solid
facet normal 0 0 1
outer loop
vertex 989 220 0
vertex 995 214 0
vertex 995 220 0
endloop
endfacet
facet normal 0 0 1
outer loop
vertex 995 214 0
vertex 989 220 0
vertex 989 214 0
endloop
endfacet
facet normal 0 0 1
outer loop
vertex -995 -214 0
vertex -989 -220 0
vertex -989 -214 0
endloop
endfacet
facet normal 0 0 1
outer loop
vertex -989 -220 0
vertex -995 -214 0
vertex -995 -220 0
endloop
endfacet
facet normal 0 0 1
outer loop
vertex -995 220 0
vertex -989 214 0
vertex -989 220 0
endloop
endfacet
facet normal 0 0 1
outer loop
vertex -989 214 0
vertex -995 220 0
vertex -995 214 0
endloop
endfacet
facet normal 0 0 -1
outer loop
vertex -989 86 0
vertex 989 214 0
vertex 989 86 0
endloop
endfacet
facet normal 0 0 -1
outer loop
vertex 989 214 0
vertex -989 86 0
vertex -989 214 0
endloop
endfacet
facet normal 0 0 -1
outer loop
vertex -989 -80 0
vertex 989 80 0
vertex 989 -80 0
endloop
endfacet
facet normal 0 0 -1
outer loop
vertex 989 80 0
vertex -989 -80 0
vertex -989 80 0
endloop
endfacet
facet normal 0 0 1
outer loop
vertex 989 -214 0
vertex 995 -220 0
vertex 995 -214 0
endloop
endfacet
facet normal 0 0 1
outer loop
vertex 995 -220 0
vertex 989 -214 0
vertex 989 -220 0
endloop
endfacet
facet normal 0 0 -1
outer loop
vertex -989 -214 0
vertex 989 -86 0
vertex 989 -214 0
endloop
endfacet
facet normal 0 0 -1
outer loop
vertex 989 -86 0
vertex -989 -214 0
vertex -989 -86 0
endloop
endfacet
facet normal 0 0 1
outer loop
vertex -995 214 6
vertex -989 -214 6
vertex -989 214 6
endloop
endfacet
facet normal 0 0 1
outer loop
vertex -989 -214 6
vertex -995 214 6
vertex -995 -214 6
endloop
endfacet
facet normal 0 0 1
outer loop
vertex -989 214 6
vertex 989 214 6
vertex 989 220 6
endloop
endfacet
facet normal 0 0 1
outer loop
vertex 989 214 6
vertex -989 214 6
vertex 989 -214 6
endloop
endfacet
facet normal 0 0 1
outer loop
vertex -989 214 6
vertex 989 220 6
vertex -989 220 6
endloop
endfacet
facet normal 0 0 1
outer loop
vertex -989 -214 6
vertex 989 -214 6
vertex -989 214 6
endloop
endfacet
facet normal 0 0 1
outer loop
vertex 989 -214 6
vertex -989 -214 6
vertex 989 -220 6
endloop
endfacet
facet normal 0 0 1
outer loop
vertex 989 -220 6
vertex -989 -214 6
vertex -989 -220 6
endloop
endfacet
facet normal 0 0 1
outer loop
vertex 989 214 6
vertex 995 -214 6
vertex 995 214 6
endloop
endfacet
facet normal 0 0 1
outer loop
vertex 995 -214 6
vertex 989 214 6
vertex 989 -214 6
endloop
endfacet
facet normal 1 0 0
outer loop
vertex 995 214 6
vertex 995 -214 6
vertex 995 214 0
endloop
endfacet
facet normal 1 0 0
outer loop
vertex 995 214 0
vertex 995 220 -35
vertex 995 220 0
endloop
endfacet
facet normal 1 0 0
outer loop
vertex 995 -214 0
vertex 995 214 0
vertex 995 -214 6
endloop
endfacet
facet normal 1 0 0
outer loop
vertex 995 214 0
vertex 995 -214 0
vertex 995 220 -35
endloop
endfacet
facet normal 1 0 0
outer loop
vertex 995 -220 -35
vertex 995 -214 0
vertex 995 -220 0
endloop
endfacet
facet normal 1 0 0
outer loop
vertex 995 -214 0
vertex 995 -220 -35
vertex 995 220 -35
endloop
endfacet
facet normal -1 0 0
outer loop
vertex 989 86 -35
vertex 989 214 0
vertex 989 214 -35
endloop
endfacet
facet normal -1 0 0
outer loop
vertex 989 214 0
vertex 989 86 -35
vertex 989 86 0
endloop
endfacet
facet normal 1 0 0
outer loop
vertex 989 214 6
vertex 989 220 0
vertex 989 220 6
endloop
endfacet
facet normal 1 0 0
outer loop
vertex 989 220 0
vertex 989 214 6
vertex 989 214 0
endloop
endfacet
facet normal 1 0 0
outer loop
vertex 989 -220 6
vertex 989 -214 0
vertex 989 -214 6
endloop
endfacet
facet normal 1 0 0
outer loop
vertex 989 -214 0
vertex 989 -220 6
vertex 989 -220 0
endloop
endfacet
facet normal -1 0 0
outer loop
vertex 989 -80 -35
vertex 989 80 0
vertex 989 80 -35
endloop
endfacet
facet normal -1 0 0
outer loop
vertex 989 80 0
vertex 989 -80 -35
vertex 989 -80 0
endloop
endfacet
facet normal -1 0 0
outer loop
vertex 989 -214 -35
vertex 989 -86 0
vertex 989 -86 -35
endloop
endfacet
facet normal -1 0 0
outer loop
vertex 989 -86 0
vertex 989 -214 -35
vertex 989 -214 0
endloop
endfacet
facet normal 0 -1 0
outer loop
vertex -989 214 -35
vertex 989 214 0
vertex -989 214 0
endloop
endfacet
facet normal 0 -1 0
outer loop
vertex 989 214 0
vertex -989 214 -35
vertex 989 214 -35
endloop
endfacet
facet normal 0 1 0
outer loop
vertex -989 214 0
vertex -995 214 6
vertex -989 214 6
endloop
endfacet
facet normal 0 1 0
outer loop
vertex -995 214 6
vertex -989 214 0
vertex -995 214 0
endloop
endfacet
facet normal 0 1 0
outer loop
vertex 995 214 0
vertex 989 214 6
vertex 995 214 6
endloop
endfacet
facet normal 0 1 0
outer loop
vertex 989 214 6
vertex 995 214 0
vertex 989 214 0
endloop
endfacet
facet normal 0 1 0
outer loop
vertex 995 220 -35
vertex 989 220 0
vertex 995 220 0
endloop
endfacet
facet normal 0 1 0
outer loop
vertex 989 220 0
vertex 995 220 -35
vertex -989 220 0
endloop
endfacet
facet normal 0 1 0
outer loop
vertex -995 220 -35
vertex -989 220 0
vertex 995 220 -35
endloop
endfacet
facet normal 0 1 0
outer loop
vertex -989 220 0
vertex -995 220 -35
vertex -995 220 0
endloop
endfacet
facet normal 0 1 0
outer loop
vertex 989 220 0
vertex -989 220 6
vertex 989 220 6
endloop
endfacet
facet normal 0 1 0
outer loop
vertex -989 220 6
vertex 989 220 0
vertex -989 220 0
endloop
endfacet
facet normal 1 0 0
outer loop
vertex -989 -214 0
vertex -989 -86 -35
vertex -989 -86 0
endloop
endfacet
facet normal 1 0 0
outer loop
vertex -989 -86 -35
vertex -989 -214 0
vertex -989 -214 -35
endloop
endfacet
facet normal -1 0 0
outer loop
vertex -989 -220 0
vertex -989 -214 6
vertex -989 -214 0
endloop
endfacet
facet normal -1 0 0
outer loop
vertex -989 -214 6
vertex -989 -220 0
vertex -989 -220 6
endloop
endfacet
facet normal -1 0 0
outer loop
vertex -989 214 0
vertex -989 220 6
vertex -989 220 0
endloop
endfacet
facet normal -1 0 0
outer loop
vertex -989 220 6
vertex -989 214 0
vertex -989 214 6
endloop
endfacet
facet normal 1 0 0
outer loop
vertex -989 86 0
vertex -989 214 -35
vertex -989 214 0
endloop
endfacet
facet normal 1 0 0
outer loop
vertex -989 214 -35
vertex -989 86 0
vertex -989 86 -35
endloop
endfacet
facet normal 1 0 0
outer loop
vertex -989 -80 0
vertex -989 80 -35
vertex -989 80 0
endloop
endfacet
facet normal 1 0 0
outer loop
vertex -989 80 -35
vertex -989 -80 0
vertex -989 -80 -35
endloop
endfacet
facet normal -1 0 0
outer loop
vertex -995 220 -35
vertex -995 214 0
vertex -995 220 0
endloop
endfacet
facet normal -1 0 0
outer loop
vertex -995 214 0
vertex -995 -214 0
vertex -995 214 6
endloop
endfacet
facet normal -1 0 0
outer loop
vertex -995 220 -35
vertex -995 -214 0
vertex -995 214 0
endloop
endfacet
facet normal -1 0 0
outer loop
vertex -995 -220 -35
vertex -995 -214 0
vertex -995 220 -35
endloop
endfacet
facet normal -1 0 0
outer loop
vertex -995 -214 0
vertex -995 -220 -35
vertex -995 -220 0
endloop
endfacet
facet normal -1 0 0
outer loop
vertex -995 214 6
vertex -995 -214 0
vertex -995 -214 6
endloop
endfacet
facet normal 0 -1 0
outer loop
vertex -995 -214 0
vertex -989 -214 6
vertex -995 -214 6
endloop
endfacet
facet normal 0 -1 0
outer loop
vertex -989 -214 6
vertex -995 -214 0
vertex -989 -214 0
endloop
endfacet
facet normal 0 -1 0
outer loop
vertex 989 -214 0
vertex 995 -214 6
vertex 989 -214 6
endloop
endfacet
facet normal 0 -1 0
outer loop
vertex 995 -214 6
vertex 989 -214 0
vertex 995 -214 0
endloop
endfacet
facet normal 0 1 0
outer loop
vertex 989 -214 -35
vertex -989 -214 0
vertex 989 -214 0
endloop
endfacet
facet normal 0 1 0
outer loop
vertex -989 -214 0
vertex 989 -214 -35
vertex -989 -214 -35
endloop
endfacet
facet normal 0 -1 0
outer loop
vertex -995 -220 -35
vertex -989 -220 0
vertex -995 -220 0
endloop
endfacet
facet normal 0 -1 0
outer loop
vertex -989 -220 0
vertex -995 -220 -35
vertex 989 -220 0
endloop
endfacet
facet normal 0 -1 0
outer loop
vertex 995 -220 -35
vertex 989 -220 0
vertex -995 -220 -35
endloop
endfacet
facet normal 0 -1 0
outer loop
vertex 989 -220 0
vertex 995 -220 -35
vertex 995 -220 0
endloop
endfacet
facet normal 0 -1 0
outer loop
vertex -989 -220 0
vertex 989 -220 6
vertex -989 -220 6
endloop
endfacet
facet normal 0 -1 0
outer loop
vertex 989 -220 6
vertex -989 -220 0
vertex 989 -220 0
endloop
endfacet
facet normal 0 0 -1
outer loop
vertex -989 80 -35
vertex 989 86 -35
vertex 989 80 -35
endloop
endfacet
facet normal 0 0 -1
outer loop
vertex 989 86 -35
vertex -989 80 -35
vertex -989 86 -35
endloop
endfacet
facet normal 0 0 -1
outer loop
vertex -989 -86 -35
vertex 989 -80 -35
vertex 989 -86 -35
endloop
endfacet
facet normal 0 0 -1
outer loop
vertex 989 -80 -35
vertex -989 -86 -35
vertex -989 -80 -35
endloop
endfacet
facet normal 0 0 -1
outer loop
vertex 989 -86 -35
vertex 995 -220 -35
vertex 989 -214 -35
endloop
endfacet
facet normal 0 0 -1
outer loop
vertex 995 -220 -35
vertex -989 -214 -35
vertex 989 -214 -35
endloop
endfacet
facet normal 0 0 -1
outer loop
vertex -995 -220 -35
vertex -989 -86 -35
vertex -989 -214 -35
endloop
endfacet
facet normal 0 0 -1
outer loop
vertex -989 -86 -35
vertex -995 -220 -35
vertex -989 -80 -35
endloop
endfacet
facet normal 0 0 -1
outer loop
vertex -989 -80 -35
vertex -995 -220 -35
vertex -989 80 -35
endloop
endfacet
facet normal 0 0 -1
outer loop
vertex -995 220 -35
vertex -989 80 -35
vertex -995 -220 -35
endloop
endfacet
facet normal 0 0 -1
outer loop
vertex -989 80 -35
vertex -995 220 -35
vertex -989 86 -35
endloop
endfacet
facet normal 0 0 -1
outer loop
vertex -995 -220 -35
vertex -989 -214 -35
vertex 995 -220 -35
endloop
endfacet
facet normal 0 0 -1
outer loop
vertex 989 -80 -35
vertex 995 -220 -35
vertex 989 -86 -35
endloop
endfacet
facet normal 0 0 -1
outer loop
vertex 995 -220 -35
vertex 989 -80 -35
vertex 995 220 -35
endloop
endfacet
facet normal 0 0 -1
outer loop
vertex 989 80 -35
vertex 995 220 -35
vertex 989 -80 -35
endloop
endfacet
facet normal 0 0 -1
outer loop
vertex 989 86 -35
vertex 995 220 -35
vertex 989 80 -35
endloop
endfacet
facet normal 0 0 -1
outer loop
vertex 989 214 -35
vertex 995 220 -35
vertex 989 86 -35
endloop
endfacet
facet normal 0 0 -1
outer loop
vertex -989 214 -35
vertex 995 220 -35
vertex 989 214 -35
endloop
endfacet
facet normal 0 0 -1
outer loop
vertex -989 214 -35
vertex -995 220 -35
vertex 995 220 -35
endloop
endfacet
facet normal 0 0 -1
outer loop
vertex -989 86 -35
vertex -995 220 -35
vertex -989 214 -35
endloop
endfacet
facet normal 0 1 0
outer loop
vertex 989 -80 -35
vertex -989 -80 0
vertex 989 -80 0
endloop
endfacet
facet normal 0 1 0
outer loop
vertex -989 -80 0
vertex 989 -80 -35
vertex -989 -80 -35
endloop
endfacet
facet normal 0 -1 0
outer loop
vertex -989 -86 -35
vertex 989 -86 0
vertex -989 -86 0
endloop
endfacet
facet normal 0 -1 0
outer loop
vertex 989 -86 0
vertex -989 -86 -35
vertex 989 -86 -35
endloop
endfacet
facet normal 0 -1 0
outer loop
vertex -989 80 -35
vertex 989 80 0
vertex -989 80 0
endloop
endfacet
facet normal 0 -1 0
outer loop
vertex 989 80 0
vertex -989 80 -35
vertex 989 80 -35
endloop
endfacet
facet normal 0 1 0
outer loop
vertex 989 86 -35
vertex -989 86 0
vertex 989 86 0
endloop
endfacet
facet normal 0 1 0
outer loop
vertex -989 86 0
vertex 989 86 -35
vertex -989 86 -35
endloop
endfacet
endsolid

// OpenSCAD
// file: BasePiezas.scad
/*
     -/+oooo+:.     
  `/syo/:::/+syo-   
 `sy+.     ```-sy/  
 +y+      +::+`-yy- 
 sy-      +-:o:-oy/ 
 sy-       ``   +y/ 
 sy-            /y/ 
 sy-            /y/ 
 sy.            /y/ 
 sy/............oy/ 
 sysoooooooooooosy/ 
`sy/............oy+ 
syyyssssssssssssyyy/
/++++oys++++yy+++++-
     /y+    yy.     
     /y+    yy.     
     `-`    ss` 
    
     IDEA 1.61        
*/


//modulos para el renderizado de varios tipos de caja a manufacturear en la máquina de corte lAser

//Largo se desplaza en "X"
//Ancho se desplaza en "Y"

module base(largo=80,ancho=80,espesor=3,dientes=20,Up=1,Down=1,Left=1,Right=1){
tamDientesLargo=(largo)/dientes;
tamDientesAncho=(ancho)/dientes;


union(){

//Dientes derecha
  if(Right==1){
    translate([largo/2,-ancho/2-tamDientesAncho/2])
    for(i=[1:dientes/2]){
       translate([0,tamDientesAncho*2*i])
       square([2*espesor,tamDientesAncho],center=true);
    }
}

//Dientes Izquierda

if(Left==1){
   translate([-largo/2,-ancho/2-3*tamDientesAncho/2])
   for(i=[1:dientes/2]){
      translate([0,tamDientesAncho*2*i])
      square([2*espesor,tamDientesAncho],center=true);
   }
}

//Dientes Arriba

if(Up==1){
   translate([-largo/2-3*tamDientesLargo/2,ancho/2])
   for(i=[1:dientes/2]){
     translate([tamDientesLargo*2*i,0])
     square([tamDientesLargo,2*espesor],center=true);
   }
}

//Dientes Abajo

if(Down==1){
   translate([-largo/2-tamDientesLargo/2,-ancho/2])
    for(i=[1:dientes/2]){
     translate([tamDientesLargo*2*i,0])
     square([tamDientesLargo,2*espesor],center=true);
    }
}

//Cuadrado
square([largo,ancho],center=true);
}

}//Fin module base


//#####CAJA SIN O CON TAPA####//

module cajaSCTapa (largo=40,ancho=30,alto=40,espesor=3,dientes=6,modo=1,
  tolBisagras=2.2){

//base
        
    if(modo==2){
    base(largo,ancho,espesor,dientes,1,1,0,0);
        }
       else{
        base(largo,ancho,espesor,dientes,1,1,1,1);
           }
    
//Tapa
    
 if(modo==1){
    translate([((largo)+(2.5*espesor)),0])
    square([largo,ancho],center=true);
    
    translate([((largo)+(2.5*espesor)),-ancho/2+(1.5*espesor)])
    square([largo+2*espesor,espesor],center=true);
  
     translate([((largo)+(2.5*espesor)),+ancho/2])
    square([2*espesor,2*espesor],center=true);
 
     //}

//lados largo
 
 //if(modo==1){
 
    translate([0,(ancho+alto)/2+(2.5*espesor)])
   difference(){
       for(i=[0:1]){
          translate([((i*largo)+(i*2.5*  espesor)),0])
           difference(){
          base(largo,alto,espesor,dientes,0,  1,1,1);
               translate([0,(alto)/2])
           square([i*2*espesor,i*2*espesor],center=true);
            }
       }
       
       
     translate([0,alto])
    square([2*espesor,2*espesor],center=true);
   }
   
   //lados alto
  
      //reinicio
    translate([0,-ancho-(2.5*espesor)])
 difference(){
  union(){
   for(i=[0:1]){
      translate([((i*alto)+(i*2.5*espesor)),0])
     base(alto,ancho,espesor,dientes,1,1,0,1);
   }
   //circulos orillas (Material)
   
   translate([-((alto-espesor)/2),(ancho/2)-(1.5*espesor)])
   circle($fn=100,r=2*(espesor/2+0.5));
   
   translate([-(((alto-espesor)/2))+alto+(2.5*espesor),-(ancho/2)+(1.5*espesor)])
   circle($fn=100,r=2*(espesor/2+0.5));
   
  }
  
  //taladros bisagras
  
  
   translate([-(((alto-espesor)/2)),(ancho/2)-(1.5*espesor)])
   circle($fn=100,r=(espesor/2+0.5)-tolBisagras);
  
  translate([-(((alto-espesor)/2))+alto+(2.5*espesor),-(ancho/2)+(1.5*espesor)])
   circle($fn=100,r=(espesor/2+0.5)-tolBisagras);


 
  }
  
 
   
 }//fin modo 1
 
 
 if(modo==2){
      translate([0,(ancho+alto)/2+(2.5*espesor)])
   for(i=[0:1]){
      translate([((i*largo)+(i*2.5*  espesor)),0])
      base(largo,alto,espesor,dientes,0,  1,0,0);   
   }
 
 } 
 
 /*else{
     
 translate([0,(ancho+alto)/2+(2.5*espesor)])
   for(i=[0:1]){
      translate([((i*largo)+(i*2.5*  espesor)),0])
       
      base(largo,alto,espesor,dientes,0,  1,1,1);
        
   }
 
  }*/




 if(modo==2){
 //no hay reinicio
 //No dibujar nada en modo 2
 }
 
 if(modo==0){
   //reinicio
   translate([0,-ancho-(2.5*espesor)])
     for(i=[0:1]){
      translate([((i*alto)+(i*2.5*espesor)),0])
     base(alto,ancho,espesor,dientes,1,1,0,1);
   }
 }
  
  
}//Fin module cajaSCTapa

//####RENDERIZADOS#####//

//$1000 pino o MDF 1.22x2.44mm

module Armado(){
    //lonTotXm=2072.2mm;
    //lonProfunidadCyan=440mm;
    //alto 1240
    espesor=9;

    lonX=2072.2-(2*espesor);
    lonY=440-(2*espesor);
    lonZ=1240-(2*espesor);


    //base
    color("cyan",alpha=0.5)
    linear_extrude(height=6)
    base(lonX,lonY,espesor,10,0,1,1,1);

    //pared mayor (refuerzo)
    color("green",alpha=0.5)
    translate([0,-espesor,(lonZ/2)+espesor])
    rotate([90,0,0])
    linear_extrude(height=6)
    base(lonX,lonZ,espesor,10,1,1,1,1);

    //pared mayor 2
    color("green",alpha=0.5)
    translate([0,-(lonY/2)-espesor,(lonZ/2)+espesor])
    rotate([90,0,180])
    linear_extrude(height=6)
    base(lonX,lonZ,espesor,10,1,1,1,1);

    //pared menor 1
    color("orange",alpha=0.5)
    translate([-(lonX/2)-espesor,0,(lonZ/2)+espesor])
    rotate([90,0,90])
    linear_extrude(height=6)
    base(lonY,lonZ,espesor,10,1,1,1,0);

    //pared menor 2
    color("orange",alpha=0.5)
    translate([(lonX/2)+espesor,0,(lonZ/2)+espesor])
    rotate([270,0,90])
    linear_extrude(height=6)
    base(lonY,lonZ,espesor,10,1,1,1,0);

    //tapa 
    color("cyan",alpha=0.5)
    translate([0,0,lonZ+(espesor*2)])
    rotate([180,0,0])
    linear_extrude(height=6)
    difference(){
       base(lonX,lonY,espesor,10,1,0,1,1);
        translate([0,-500])
       square([4000,1000],center=true);
    }

}


 Armado();


//linear_extrude(height=3)
//cajaSCTapa(largo=110,ancho=80,alto=50,espesor=6,dientes=4,modo=0,tolBisagras=0);
// main file
use<BasePiezas.scad>;

//relacion de TV encontrada 1.72
//Meiddas de Tv actual 124cm x 72 cm
//apoyos patas 6cm
//hiptenusa actual de 143.38
//hipotenusa futura 143.38+50cm=193.38cm
//begin{equation}
//50^2=(1.72x)^2+x^2
//enb{equation}
//despejando x
//x es 25.1310
//usando x tenemos que
//ancho TV nueva MAX = 167.22
//altura TV nueva MAX = 97.13
//mas 6 cm de apoyos patas queda de 103.13
//medidas anteriores mueble blanco es de 
//X:161cm, Y:34cm, Z=124cm



module TeleNueva(){
    anTVnv=167.22;
    altTVnv=97.13;
    cvmmcm=10;

    espRail=200;

    //television Nueva
    //translate([espRail,espCal+50,270])
    //translate([espRail,230,270+(altTVnv*cvmmcm)])
    //color("gray")
    union(){
        translate([0,0,60])
        cube([anTVnv*cvmmcm,30,altTVnv*cvmmcm]);
        translate([(anTVnv*cvmmcm)/2,110,(altTVnv*cvmmcm)/2])
        cube([220,220,220],center=true);
        translate([30,-120,0])
        cube([20,240,60]);
        
         translate([(anTVnv*cvmmcm)-50,-120,0])
        cube([20,240,60]);
    }

}

module Calentador(){
    espCal=170;
    //calentador
    color("red")
    translate([lonTotXm/2,espCal/2,250])
    //calentador todo pie
    //cube([560,270,500],center=true);
    //placa hacia atras 17cm
    cube([560,espCal,500],center=true);

    lonTotXm=(anTVnv*cvmmcm)+(2*espRail);
    lonTotY=220+espCal+50;
    //echo(lonTotY);
    
}

//#############RENDERIZADOS###############

//motorNEMA17();

//TeleNueva();

//Calentador();

//lonTotXm=2072.2mm;
//lonProfunidadCyan=440mm;
//alto 1240
//echo(lonTotXm);
//color("cyan",alpha=0.5)
//mueble original
//cube([1600+(2*espRail),400,1240]);
/*difference(){

    cube([lonTotXm,lonTotY,1240]);
    translate([lonTotXm/2,-100,250])
   cube([660,270*2,600],center=true);
}*/


//color("cyan",alpha=0.5)
//    linear_extrude(height=6)


espesor=6;
altura=35;
largoP=1990;
//square([2030,440],center=true);
    linear_extrude(height=espesor)
    base(largoP-(2*espesor),440-(2*espesor),espesor,8,1,1,1,1);
    
    //lado frente 1
    translate([0,-(440/2)+espesor,-altura/2])
    rotate([-90,0,180])
    linear_extrude(height=espesor)
    base(largoP-(2*espesor),altura,espesor,8,0,1,1,1);
    
    //lado frente 2
    translate([0,-80,-altura/2])
    rotate([-90,0,180])
    linear_extrude(height=espesor)
    base(largoP-(2*espesor),altura,espesor,8,0,1,1,1);
    
    //lado atrAs 1
    translate([0,(440/2)-espesor,-altura/2])
    rotate([-90,0,0])
    linear_extrude(height=espesor)
    base(largoP-(2*espesor),altura,espesor,8,0,1,1,1);
    
    //lado atrAs 2
    translate([0,80,-altura/2])
    rotate([-90,0,0])
    linear_extrude(height=espesor)
    base(largoP-(2*espesor),altura,espesor,8,0,1,1,1);
    
    //lado derecha
     translate([(largoP/2)-espesor,0,-altura/2])
    rotate([-90,0,270])
    linear_extrude(height=espesor)
    base(440-(2*espesor),altura,espesor,8,0,1,1,1);
    
     //lado derecha
     translate([-(largoP/2)+espesor,0,-altura/2])
    rotate([-90,0,90])
    linear_extrude(height=espesor)
    base(440-(2*espesor),altura,espesor,8,0,1,1,1);
    
    


 
 //translate([lonTotXm/2,lonTotY/2,0])
 //Armado();
 
//polygon([[-10,0],[10,0],[0,5]]);

// $320 MDF 6mm  corte pasado(cajas) $1600

// $200 1.22x244 MDF 3mm (considerar
